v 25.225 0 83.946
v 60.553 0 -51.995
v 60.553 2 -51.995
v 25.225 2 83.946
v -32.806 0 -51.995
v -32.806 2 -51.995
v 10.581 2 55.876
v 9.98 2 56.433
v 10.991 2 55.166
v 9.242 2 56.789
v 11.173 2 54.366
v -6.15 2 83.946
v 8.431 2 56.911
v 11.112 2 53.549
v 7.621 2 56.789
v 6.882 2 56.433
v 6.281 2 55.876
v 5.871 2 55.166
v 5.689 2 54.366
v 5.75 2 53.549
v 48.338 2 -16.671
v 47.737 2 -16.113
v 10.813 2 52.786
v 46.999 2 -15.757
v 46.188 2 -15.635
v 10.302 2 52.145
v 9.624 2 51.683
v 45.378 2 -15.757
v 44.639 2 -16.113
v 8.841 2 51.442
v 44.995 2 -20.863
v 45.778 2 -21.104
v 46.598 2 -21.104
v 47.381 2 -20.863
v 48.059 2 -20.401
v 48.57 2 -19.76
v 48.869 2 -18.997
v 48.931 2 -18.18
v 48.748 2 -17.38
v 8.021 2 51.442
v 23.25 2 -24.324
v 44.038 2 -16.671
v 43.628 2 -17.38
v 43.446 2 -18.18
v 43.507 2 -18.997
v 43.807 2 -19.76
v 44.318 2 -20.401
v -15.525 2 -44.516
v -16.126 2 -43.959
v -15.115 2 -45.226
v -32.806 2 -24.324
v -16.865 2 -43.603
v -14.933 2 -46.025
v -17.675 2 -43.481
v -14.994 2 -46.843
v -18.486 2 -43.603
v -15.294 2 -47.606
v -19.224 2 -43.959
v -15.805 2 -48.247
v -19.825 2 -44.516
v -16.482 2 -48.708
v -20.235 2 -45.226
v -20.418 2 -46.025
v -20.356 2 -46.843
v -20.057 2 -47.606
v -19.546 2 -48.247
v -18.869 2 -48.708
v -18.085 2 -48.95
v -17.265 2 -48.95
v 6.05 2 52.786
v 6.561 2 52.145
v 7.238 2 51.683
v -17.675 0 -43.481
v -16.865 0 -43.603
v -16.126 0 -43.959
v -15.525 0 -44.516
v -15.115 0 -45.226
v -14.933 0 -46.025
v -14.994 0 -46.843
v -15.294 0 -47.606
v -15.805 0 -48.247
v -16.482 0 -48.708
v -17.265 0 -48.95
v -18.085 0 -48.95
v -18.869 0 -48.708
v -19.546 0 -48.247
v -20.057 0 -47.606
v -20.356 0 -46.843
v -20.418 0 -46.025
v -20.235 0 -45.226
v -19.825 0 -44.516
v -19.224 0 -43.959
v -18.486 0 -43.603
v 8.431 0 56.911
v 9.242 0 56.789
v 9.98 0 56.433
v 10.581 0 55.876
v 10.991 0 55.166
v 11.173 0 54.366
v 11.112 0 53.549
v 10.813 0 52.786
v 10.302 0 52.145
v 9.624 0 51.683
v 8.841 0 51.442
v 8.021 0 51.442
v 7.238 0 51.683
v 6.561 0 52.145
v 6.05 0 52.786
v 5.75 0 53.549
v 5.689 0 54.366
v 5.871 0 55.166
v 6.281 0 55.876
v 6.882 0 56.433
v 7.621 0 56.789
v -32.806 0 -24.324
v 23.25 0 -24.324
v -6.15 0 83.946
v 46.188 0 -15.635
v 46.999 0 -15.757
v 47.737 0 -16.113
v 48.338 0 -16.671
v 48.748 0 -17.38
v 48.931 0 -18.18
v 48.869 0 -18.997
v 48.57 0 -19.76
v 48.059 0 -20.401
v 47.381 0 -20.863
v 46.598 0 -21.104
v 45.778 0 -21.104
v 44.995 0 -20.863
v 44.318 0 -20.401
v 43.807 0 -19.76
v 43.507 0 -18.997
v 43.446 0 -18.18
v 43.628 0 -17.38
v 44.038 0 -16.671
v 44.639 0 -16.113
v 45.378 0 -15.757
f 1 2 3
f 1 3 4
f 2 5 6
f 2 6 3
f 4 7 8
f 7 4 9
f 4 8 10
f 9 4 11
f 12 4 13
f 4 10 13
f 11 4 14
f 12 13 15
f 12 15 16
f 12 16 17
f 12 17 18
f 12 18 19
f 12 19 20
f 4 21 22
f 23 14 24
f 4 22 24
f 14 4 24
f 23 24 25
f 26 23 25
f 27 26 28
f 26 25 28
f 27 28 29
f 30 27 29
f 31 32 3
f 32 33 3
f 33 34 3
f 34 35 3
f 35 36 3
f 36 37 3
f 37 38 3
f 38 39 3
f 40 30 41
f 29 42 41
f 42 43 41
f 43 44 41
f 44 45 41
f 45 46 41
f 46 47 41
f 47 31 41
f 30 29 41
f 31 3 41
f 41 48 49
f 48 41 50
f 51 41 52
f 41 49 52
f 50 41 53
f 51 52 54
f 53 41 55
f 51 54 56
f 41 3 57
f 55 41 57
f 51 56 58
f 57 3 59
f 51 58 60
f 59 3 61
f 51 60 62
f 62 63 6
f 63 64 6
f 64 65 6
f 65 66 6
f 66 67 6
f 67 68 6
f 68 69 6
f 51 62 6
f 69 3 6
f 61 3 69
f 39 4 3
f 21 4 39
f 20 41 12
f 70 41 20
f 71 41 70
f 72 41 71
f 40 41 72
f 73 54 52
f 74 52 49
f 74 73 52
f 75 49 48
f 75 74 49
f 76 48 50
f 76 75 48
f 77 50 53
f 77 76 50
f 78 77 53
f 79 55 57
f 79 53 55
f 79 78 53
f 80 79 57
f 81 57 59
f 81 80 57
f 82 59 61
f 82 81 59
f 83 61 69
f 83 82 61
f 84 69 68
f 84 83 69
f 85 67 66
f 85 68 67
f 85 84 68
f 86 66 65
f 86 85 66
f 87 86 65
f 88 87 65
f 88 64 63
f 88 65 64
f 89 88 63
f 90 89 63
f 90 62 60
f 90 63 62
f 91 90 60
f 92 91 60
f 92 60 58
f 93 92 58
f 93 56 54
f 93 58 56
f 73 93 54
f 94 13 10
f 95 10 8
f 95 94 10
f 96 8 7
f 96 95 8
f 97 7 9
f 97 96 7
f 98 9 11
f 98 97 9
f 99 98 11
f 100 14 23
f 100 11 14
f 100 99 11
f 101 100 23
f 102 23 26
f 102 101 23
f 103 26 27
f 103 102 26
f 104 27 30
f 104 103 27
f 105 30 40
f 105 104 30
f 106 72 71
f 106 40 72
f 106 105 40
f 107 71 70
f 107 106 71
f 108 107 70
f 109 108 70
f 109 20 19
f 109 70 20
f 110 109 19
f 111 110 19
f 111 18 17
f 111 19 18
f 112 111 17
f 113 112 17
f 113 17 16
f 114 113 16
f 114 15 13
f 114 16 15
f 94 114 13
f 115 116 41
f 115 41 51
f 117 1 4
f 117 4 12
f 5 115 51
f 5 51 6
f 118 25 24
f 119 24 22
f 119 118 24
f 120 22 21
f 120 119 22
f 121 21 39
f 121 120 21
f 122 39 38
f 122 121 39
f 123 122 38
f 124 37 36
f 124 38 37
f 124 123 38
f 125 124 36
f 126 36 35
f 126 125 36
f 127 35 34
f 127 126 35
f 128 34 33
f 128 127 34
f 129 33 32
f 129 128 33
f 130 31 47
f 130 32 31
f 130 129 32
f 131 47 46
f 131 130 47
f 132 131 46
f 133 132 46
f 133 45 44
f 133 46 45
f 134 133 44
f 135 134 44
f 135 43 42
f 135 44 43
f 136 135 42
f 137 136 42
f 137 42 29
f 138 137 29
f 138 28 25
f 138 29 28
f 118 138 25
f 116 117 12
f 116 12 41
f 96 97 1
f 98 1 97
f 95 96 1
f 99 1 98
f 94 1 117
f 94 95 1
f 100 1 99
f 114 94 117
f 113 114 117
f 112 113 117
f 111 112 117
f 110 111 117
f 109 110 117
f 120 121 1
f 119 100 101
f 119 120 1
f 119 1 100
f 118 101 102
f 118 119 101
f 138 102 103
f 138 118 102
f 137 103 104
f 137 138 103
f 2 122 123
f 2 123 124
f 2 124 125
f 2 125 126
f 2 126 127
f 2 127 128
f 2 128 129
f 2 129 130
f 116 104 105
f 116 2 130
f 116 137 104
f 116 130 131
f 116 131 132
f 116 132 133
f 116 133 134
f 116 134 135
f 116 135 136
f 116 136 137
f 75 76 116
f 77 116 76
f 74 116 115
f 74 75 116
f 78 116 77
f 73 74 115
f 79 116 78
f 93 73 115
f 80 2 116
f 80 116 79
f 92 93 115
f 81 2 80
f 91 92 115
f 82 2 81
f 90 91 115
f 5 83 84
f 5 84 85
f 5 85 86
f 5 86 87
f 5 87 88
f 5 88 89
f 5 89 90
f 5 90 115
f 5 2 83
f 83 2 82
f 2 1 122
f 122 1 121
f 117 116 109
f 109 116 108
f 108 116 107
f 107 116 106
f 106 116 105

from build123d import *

# Parameters (mm, degrees)
BOSS_EXTRUDE1_DEPTH = 2
SKETCH7_R           = 2.75
CUT_EXTRUDE1_DEPTH  = 104.526033301


with BuildPart() as part:
    # Sketch1 → Boss-Extrude1 (new body)
    with BuildSketch(Plane(origin=(0, 0, 0), x_dir=(1, 0, 0), z_dir=(0, 1, 0))):
        Polygon((-32.806430064, 51.994551896), (60.552740485, 51.994551896), (25.225039266, -83.946442395), (-6.149932227, -83.946442395), (23.249976258, 24.323717363), (-32.806430064, 24.323717363), align=None)
    extrude(amount=BOSS_EXTRUDE1_DEPTH)

    # Sketch7 → Cut-Extrude1 (cut, through all)
    with BuildSketch(Plane(origin=(0, 0, 0), x_dir=(1, 0, 0), z_dir=(0, 1, 0))):
        with Locations(Location((-17.67535185, 46.230759465, 0), (0, 0, 270))):
            Circle(SKETCH7_R)
        with Locations(Location((46.18825301, 18.385111047, 0), (0, 0, 270))):
            Circle(SKETCH7_R)
        with Locations(Location((8.431159892, -54.160966994, 0), (0, 0, 270))):
            Circle(SKETCH7_R)
    extrude(amount=CUT_EXTRUDE1_DEPTH, mode=Mode.SUBTRACT)


solid = part.part
